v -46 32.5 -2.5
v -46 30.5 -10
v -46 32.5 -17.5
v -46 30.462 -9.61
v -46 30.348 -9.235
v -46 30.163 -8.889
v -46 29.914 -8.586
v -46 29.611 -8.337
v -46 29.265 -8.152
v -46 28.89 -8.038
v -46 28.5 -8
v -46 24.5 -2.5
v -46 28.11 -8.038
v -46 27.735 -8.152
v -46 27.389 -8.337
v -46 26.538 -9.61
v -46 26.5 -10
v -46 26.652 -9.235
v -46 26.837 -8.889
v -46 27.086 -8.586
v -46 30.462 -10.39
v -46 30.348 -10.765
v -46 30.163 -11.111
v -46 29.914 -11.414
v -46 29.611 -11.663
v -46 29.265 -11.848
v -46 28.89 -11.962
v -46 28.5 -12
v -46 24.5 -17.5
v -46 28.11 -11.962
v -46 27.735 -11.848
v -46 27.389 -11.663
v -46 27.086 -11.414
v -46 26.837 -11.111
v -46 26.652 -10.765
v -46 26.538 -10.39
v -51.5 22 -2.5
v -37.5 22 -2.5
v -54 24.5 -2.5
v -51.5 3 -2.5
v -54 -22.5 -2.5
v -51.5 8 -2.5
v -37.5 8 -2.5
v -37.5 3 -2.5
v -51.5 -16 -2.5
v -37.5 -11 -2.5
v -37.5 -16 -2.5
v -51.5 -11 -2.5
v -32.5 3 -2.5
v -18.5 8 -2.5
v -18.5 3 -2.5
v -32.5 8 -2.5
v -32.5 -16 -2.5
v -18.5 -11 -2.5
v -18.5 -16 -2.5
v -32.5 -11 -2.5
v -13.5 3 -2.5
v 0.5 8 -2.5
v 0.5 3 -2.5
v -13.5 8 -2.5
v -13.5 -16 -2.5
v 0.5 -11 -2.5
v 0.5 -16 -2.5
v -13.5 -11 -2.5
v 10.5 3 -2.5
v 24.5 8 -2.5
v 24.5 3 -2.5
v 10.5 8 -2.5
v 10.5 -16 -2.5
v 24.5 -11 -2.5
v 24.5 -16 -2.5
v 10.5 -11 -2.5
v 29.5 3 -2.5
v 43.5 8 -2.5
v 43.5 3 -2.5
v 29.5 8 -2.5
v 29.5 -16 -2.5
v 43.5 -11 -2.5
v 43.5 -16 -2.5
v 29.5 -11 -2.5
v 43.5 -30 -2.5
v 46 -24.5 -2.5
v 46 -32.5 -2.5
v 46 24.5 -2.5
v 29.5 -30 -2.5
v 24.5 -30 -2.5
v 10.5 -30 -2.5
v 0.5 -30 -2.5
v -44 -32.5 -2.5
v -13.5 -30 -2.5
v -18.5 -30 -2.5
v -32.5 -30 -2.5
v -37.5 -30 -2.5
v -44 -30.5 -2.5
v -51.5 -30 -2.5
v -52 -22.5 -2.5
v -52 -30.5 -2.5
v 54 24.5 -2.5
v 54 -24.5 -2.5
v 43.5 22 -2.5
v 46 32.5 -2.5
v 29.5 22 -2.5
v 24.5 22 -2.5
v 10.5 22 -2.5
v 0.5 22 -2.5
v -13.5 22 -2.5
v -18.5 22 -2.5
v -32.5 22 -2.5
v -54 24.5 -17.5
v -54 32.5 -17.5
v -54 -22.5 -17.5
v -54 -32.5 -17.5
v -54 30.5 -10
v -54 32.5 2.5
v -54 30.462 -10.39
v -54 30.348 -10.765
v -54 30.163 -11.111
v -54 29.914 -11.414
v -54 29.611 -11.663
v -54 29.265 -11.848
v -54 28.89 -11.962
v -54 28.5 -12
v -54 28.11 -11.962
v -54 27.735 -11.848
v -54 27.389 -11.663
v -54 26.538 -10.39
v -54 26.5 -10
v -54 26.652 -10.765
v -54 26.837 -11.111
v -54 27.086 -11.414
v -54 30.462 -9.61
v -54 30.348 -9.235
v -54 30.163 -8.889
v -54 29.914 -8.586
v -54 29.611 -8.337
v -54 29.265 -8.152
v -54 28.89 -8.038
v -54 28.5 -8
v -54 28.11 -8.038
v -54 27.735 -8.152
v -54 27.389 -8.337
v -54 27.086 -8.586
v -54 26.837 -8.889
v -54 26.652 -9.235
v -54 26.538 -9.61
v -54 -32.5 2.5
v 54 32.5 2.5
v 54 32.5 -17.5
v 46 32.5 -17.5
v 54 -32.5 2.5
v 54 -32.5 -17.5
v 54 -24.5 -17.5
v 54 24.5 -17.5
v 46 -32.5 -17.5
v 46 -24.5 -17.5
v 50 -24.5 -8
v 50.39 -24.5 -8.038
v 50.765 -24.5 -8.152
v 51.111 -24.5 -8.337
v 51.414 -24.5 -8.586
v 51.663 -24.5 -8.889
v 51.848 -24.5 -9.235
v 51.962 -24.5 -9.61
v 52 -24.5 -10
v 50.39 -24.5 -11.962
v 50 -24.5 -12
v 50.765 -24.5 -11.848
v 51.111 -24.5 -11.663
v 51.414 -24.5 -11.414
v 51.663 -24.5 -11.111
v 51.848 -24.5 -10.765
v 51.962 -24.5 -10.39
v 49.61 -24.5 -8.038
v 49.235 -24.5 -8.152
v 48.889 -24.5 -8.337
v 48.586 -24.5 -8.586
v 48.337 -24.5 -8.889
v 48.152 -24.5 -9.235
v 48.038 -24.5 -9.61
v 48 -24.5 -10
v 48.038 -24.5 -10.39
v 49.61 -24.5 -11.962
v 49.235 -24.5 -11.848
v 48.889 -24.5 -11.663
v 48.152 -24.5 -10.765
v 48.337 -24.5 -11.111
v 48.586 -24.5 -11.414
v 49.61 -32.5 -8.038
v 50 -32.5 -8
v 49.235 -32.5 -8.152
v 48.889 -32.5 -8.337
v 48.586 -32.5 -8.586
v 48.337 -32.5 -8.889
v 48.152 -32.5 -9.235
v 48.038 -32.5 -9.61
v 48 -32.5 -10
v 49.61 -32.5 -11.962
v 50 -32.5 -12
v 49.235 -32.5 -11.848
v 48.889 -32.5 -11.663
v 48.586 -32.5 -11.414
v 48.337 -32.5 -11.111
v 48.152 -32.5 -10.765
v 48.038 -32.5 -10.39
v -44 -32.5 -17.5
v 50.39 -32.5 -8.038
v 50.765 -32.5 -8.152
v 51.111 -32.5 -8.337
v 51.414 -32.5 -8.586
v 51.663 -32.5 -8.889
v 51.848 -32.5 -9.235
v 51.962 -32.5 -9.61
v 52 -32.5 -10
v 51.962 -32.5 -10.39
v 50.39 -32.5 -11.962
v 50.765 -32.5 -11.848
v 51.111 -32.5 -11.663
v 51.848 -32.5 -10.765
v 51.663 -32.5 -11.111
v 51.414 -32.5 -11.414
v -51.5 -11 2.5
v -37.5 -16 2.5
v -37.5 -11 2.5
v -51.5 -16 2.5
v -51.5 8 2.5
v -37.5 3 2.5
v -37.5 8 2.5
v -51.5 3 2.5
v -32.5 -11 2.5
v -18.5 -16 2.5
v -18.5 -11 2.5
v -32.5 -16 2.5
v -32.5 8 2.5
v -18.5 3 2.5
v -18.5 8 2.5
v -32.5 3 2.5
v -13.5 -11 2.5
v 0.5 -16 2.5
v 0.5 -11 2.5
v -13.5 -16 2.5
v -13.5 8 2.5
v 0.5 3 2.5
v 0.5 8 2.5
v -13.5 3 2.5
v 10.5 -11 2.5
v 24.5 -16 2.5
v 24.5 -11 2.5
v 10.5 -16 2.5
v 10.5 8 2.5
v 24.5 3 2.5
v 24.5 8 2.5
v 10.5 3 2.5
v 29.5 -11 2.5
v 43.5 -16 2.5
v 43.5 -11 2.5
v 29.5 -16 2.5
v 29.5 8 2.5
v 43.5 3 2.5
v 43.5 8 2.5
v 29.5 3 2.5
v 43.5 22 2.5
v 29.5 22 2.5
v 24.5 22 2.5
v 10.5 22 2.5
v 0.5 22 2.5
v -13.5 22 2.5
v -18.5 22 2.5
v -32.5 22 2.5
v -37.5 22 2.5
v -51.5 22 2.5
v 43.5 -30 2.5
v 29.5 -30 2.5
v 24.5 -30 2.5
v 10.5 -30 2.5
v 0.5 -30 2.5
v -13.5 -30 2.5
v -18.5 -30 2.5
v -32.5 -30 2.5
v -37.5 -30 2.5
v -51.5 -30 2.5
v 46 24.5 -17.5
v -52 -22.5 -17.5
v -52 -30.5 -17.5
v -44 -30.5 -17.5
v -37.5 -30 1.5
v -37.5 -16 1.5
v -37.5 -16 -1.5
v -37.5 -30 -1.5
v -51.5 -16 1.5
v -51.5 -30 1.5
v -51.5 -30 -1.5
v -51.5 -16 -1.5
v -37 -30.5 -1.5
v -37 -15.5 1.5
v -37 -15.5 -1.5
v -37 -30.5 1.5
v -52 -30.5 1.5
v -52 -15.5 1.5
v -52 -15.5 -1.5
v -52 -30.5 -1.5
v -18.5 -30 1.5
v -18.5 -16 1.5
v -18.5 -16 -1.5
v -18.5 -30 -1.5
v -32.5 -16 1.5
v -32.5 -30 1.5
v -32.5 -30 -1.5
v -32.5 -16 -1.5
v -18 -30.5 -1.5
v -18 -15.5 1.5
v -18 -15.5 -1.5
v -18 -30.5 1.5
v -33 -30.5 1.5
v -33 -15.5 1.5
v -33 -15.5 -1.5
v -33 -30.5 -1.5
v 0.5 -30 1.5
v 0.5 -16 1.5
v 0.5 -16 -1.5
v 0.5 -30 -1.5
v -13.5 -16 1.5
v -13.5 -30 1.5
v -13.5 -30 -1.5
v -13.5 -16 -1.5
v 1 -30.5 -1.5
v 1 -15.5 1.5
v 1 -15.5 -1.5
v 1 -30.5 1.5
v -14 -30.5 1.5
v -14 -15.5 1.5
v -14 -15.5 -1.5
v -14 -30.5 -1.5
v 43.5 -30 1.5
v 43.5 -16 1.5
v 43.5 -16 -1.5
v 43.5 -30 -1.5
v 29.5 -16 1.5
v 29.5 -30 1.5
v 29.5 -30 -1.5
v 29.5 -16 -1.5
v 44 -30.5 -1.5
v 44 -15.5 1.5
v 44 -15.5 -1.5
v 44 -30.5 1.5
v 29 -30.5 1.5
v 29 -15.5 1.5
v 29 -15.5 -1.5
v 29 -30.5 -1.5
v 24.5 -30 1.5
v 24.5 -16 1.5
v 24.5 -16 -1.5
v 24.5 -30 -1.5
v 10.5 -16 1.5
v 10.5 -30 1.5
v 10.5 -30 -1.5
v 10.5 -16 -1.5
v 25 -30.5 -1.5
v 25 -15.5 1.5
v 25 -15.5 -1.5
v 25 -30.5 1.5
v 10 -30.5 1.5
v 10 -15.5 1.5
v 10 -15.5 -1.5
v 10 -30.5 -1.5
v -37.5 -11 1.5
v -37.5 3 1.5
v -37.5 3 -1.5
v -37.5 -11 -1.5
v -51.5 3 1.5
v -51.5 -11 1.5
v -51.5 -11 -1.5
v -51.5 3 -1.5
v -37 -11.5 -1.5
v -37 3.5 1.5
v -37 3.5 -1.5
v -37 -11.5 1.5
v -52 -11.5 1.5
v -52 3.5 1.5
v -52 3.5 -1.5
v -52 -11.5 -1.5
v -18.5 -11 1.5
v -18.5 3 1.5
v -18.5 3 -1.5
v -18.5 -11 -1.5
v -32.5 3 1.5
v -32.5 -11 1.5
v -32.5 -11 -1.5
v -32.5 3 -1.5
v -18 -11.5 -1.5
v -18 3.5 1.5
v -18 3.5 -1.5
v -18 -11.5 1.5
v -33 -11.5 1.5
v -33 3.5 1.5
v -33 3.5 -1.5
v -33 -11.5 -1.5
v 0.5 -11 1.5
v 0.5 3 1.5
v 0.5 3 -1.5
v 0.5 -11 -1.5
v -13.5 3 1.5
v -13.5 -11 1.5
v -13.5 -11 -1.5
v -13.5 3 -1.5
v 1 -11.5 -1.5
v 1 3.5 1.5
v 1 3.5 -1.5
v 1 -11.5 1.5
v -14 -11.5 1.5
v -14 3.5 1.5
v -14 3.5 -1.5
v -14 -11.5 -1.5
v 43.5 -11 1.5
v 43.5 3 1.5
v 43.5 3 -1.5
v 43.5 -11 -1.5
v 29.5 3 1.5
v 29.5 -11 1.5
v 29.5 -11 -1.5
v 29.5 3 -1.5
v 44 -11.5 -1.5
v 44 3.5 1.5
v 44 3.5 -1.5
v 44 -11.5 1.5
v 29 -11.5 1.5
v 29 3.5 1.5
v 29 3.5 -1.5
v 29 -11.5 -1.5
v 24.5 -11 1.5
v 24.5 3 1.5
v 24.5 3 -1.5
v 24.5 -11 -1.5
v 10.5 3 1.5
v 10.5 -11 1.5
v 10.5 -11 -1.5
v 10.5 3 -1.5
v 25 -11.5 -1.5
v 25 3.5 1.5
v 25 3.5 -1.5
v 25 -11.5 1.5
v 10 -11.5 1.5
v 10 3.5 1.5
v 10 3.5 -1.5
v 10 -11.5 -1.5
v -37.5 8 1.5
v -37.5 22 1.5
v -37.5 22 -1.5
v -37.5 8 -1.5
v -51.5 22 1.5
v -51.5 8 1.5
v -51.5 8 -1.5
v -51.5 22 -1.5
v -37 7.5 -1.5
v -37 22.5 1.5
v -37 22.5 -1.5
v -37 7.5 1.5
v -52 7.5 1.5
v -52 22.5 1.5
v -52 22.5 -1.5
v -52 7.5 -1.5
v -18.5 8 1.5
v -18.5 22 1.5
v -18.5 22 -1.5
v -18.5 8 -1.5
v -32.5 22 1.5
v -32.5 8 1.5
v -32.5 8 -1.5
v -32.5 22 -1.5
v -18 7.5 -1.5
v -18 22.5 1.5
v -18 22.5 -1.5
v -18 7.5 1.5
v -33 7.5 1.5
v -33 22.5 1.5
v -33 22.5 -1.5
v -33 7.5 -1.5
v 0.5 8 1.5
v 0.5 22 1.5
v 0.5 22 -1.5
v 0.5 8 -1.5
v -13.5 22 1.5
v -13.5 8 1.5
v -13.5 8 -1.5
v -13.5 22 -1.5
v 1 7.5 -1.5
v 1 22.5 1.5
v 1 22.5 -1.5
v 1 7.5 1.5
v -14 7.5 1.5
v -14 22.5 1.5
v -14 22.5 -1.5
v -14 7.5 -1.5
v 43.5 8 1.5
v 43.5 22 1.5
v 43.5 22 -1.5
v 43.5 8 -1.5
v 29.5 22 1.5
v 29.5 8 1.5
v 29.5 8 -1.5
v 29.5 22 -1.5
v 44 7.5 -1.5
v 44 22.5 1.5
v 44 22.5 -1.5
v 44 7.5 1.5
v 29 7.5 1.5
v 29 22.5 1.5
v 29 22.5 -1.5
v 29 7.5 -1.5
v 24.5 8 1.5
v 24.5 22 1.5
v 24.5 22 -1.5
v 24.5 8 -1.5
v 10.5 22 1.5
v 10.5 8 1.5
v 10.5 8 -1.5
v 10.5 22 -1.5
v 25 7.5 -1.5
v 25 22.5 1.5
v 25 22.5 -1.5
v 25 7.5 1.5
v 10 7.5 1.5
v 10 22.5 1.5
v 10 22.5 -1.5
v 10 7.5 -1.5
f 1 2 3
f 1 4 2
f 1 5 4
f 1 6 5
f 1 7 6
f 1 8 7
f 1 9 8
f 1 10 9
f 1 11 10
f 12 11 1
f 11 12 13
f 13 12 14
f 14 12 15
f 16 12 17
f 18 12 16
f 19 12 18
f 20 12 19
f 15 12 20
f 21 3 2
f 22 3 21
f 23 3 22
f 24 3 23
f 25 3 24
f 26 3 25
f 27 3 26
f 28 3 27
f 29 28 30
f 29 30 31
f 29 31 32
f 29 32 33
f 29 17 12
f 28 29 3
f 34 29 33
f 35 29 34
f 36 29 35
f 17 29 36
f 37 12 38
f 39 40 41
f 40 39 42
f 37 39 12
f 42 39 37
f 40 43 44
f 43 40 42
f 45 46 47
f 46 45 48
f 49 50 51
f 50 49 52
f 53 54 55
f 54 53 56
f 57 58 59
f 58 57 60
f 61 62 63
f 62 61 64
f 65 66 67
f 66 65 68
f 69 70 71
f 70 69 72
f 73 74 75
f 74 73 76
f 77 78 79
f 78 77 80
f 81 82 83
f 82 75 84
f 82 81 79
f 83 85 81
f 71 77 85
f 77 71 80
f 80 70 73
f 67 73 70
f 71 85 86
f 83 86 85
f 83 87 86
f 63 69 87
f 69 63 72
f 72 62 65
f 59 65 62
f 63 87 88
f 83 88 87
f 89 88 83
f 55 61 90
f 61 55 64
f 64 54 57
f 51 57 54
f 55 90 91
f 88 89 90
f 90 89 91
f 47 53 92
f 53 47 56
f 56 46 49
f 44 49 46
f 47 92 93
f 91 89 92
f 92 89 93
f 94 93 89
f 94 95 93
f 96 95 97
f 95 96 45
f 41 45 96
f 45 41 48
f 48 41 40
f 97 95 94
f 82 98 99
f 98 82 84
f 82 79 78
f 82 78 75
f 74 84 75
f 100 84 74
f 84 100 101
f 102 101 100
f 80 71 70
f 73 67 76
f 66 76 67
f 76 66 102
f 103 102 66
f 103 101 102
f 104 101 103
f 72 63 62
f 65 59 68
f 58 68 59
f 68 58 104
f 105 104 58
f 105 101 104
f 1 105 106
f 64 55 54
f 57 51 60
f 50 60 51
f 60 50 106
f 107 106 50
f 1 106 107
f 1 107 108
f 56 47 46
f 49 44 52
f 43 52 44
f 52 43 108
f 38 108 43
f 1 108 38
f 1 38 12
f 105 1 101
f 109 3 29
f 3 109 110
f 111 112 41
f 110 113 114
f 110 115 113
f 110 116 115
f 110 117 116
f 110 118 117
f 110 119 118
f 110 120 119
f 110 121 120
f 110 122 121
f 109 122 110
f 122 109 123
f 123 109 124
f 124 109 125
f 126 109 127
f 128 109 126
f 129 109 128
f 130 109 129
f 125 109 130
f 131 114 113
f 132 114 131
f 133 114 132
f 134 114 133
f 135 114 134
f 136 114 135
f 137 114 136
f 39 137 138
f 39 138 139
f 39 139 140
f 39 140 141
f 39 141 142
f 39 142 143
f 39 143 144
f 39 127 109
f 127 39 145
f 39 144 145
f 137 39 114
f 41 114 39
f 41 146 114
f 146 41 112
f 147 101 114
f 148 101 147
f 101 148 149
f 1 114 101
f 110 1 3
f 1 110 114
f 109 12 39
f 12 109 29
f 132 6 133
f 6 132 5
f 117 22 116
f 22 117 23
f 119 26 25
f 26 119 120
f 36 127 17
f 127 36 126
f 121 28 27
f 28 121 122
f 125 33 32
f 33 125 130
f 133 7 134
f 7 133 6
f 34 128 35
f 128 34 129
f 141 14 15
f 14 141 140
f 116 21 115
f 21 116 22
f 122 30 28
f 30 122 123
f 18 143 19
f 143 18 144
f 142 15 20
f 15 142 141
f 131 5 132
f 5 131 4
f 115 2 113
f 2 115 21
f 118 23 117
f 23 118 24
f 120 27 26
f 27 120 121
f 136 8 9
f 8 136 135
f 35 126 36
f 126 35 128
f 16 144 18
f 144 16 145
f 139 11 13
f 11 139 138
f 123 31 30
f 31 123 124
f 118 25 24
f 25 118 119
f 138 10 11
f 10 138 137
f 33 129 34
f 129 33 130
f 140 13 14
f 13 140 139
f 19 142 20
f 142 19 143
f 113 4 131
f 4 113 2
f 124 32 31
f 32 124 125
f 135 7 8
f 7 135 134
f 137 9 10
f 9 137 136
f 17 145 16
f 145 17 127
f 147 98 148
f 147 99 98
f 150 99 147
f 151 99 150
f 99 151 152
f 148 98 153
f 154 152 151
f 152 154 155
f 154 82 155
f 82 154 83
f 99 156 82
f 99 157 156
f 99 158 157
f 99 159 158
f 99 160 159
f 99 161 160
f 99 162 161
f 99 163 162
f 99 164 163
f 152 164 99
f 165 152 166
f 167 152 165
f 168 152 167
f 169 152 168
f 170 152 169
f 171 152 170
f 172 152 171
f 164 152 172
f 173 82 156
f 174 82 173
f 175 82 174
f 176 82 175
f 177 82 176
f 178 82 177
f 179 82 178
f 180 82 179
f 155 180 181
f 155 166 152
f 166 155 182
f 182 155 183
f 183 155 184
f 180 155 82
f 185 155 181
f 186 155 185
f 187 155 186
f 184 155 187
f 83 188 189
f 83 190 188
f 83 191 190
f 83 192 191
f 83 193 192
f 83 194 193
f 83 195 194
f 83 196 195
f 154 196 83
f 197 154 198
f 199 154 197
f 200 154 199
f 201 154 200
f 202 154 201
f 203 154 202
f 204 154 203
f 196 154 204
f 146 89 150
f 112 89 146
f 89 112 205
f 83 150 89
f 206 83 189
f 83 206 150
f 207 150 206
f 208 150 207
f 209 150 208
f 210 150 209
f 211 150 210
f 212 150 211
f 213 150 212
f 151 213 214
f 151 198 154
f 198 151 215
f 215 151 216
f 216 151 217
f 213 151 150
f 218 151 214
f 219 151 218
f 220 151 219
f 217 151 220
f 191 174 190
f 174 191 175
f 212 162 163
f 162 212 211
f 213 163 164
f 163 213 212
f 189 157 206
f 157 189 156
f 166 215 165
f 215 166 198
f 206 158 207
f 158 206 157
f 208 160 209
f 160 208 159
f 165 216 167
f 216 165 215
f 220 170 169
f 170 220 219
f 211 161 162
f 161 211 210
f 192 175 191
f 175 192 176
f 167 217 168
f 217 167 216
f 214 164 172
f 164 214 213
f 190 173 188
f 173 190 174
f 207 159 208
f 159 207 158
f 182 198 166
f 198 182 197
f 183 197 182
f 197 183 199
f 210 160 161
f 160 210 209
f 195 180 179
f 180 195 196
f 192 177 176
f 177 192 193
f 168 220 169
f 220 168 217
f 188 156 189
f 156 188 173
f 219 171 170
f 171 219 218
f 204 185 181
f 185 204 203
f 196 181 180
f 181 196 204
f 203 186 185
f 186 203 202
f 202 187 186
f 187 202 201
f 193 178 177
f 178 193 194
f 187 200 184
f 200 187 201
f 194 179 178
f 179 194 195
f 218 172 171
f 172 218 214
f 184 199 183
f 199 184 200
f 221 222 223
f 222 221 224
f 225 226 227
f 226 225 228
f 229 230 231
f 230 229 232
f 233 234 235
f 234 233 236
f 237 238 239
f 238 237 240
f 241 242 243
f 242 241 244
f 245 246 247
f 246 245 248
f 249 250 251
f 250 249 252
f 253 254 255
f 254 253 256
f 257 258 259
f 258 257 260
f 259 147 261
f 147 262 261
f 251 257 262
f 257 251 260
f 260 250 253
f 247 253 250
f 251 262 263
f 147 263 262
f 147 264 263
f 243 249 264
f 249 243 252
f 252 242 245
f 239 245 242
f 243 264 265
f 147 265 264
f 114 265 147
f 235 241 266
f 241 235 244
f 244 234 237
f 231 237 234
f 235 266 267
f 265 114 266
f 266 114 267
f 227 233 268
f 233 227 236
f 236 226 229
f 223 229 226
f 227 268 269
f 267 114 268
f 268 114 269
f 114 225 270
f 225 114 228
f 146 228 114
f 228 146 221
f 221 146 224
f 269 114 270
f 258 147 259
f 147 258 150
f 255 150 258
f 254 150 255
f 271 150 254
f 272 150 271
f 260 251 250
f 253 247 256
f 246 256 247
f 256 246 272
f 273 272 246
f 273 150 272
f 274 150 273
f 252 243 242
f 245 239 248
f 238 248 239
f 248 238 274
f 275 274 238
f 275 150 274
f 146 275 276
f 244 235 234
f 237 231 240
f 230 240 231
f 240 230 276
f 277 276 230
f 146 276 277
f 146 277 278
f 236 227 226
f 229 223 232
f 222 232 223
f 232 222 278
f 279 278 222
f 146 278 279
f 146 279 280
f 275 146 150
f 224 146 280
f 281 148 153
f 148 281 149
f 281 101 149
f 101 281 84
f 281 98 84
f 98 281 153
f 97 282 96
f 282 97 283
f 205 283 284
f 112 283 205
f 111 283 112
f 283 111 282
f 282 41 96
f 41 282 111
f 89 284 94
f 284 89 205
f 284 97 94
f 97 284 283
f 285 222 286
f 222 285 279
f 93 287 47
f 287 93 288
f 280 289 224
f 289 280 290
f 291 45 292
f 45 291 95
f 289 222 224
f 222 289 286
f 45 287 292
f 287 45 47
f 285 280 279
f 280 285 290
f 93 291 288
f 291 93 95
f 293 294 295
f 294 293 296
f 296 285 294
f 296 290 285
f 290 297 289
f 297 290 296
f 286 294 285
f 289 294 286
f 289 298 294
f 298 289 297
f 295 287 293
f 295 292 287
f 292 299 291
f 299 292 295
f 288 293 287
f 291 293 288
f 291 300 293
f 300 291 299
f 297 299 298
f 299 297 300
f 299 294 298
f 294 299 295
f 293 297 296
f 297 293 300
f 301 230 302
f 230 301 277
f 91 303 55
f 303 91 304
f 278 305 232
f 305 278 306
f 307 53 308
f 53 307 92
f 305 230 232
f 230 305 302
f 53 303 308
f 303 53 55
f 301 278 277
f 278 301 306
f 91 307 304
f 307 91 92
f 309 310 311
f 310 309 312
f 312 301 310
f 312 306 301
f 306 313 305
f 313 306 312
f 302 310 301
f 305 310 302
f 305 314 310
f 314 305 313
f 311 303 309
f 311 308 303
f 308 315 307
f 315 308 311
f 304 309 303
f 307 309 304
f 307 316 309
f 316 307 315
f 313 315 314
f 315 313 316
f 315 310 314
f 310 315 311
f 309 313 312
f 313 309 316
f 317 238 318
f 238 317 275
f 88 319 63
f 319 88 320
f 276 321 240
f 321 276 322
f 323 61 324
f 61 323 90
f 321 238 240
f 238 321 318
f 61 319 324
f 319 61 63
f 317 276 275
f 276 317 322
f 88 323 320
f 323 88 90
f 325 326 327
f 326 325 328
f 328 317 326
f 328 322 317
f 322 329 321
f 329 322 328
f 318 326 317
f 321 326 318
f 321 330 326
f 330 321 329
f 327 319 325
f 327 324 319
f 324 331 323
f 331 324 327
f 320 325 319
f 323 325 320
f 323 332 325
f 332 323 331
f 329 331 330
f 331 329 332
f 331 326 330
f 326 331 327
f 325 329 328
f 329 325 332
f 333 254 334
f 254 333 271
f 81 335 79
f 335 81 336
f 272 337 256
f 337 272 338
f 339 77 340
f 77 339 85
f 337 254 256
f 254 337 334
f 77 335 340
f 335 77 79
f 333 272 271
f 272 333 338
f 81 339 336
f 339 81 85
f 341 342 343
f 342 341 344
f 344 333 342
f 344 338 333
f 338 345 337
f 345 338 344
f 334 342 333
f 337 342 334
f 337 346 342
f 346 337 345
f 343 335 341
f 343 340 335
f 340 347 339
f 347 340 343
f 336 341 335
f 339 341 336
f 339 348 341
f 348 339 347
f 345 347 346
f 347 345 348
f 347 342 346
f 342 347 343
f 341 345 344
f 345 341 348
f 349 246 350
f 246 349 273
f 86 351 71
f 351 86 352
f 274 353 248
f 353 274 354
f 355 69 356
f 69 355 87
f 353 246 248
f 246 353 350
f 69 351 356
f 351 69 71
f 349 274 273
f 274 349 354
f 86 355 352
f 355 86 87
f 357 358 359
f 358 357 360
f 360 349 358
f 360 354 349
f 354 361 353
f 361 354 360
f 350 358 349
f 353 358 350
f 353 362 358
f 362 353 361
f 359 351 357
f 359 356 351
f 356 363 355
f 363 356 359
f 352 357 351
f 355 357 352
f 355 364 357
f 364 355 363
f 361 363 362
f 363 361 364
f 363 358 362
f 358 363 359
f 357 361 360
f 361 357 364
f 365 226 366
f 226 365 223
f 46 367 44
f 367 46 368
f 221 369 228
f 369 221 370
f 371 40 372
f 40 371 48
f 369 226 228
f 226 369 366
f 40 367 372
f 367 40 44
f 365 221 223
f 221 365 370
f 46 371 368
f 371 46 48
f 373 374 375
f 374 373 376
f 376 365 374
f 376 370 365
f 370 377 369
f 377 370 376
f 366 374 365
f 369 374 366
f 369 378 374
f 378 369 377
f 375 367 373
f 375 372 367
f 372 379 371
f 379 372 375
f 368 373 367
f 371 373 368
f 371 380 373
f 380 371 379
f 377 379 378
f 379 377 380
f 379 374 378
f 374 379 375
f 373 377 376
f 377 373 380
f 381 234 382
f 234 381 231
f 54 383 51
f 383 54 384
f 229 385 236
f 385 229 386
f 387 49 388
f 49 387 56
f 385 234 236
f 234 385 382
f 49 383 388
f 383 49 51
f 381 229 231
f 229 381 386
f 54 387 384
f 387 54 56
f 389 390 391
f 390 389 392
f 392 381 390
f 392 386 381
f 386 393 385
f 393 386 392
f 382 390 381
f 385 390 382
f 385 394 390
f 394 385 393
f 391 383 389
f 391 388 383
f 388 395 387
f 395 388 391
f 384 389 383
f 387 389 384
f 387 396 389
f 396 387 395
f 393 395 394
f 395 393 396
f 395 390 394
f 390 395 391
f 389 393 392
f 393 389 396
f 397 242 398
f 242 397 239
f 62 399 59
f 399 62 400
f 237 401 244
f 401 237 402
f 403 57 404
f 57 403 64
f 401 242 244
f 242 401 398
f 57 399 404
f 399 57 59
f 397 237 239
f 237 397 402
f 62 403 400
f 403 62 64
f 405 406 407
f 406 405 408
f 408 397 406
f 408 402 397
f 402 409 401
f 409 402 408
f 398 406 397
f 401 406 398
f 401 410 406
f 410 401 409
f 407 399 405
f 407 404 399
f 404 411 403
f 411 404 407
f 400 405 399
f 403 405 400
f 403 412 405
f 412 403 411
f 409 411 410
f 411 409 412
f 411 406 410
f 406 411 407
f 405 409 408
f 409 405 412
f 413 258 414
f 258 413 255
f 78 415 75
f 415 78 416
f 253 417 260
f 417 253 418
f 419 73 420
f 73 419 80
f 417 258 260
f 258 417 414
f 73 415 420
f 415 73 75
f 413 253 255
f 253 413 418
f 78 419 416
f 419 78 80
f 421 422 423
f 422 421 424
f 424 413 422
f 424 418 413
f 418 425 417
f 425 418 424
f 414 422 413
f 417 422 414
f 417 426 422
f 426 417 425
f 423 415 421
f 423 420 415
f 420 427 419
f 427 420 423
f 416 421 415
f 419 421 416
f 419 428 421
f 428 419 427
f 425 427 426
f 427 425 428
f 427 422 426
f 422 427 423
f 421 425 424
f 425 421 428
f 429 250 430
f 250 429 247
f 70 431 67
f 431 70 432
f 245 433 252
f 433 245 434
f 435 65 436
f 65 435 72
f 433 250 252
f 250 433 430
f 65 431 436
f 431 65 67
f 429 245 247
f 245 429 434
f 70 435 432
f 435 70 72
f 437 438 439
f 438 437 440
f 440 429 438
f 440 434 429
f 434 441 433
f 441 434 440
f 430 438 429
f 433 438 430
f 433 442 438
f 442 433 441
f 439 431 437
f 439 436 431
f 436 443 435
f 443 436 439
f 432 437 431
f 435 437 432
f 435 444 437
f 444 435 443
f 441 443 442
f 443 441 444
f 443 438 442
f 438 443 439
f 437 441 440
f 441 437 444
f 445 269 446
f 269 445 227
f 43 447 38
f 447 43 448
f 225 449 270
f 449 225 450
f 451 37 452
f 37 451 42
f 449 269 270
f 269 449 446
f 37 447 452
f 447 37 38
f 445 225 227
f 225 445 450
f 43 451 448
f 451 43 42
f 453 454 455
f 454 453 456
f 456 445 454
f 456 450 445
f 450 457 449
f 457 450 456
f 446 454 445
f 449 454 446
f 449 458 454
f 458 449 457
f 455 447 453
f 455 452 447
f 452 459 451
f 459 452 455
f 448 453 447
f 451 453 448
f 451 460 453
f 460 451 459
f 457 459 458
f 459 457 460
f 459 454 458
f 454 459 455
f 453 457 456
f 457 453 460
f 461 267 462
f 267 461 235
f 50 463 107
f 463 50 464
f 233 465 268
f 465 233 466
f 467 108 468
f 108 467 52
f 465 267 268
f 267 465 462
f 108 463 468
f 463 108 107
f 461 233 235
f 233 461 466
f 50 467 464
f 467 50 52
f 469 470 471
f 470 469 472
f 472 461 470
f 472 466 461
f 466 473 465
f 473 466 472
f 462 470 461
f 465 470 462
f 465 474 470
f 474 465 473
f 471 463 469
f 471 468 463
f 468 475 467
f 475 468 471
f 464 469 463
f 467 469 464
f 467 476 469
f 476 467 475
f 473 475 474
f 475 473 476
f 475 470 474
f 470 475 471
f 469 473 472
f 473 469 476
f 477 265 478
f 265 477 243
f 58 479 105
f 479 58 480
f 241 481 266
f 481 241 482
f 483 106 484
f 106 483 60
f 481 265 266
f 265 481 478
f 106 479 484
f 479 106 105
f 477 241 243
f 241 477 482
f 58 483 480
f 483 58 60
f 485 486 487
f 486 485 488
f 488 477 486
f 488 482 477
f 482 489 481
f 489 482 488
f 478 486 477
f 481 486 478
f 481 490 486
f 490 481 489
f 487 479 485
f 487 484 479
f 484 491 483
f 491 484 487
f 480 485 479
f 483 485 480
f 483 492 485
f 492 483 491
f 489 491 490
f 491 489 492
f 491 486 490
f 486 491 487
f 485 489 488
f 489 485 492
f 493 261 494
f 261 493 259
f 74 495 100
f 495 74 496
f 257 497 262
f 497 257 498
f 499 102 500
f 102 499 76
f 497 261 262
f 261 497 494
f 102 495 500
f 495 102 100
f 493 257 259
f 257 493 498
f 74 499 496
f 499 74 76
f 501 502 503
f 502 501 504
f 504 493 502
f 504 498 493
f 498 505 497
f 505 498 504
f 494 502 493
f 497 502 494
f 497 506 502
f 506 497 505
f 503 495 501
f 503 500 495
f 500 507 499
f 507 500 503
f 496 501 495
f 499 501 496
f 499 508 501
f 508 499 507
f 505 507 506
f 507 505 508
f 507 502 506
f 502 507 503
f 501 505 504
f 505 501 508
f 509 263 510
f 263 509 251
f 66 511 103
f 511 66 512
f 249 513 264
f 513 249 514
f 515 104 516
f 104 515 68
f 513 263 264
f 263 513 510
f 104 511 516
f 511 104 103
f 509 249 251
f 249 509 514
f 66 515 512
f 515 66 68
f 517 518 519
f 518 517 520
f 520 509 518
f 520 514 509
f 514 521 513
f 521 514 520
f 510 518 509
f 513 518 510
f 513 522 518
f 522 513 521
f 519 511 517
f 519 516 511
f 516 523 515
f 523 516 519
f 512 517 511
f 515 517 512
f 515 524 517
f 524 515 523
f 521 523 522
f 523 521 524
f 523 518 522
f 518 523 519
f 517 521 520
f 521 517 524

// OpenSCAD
// file: common.scad
key_size = 14;

b_post = 8;
m_post_s = 2;
m_post_l = 10;
post_z = 15;

plat_z = 5;

module keyhole(x, y) {
  translate([x, y, 0]) {
    cube([key_size, key_size, plat_z + 1], center = true);
    cube([key_size + 1, key_size + 1, plat_z -2], center = true);
  }
}

module e_post(x, y, z) {
  translate([x, y, -(plat_z + post_z)/2]) {
    cube([b_post, b_post, post_z], center = true);
  }
}

module e_post_i(x, y, r) {
  translate([x, y, -(plat_z + post_z)/2]) {
    difference() {
      cube([b_post, b_post, post_z], center = true);
      rotate(r) cylinder(h=b_post+1, r=2, center=true, $fn=32);
    }
  }
}

module e_post_x(x, y) {
  e_post_i(x, y, [0, 90, 0]);
}


module e_post_y(x, y) {
  e_post_i(x, y, [90, 0, 0]);
}

module i_post_x(x, y) {
  translate([x, y, -(plat_z + post_z)/2]) cube([m_post_l, m_post_s, post_z], center = true);
}

module i_post_y(x, y) {
  translate([x, y, -(plat_z + post_z)/2]) cube([m_post_s, m_post_l, post_z], center = true);
}
// file: parameters.scad
key_size = 14;
key_sep = 5;
m_key_sep = 13.5;
l_key_sep = 33;

border = 8;
b_post = 8;
m_post_s = 2;
m_post_l = 10;
post_z = 15;

key_cell = key_size + key_sep;
m_key_cell_x = key_size + m_key_sep;
l_key_cell_x = 2*key_cell;

plat_z = 5;
// main file
// Ortho Mega section 4. Top right corner.

include <parameters.scad>

extra = 5;

plat_x = border + 5*key_cell + extra;
plat_y = border + 3*key_cell;



use <common.scad>

difference() {
  union() {
    cube([plat_x, plat_y, 5], center = true);
    e_post_x(-(plat_x-b_post)/2, (plat_y-b_post)/2);
    e_post((plat_x-b_post)/2, (plat_y-b_post)/2);
    e_post_y((plat_x-b_post)/2, -(plat_y-b_post)/2);
    
    i_post_y(-(plat_x - m_post_s)/2, -(plat_y - m_post_l)/2);
    i_post_x(-(plat_x - m_post_l)/2, -(plat_y - m_post_s)/2);
  }

  for (y = [0:2]) {
    for (x = [0:2]) {
      keyhole(-plat_x/2 + key_cell/2 + x*key_cell, -plat_y/2 + key_cell/2 + y*key_cell);
    }
    for (x = [0:1]) {
      keyhole(plat_x/2 - border - key_cell/2 - x*key_cell, -plat_y/2 + key_cell/2 + y*key_cell);
    }
  }
}
